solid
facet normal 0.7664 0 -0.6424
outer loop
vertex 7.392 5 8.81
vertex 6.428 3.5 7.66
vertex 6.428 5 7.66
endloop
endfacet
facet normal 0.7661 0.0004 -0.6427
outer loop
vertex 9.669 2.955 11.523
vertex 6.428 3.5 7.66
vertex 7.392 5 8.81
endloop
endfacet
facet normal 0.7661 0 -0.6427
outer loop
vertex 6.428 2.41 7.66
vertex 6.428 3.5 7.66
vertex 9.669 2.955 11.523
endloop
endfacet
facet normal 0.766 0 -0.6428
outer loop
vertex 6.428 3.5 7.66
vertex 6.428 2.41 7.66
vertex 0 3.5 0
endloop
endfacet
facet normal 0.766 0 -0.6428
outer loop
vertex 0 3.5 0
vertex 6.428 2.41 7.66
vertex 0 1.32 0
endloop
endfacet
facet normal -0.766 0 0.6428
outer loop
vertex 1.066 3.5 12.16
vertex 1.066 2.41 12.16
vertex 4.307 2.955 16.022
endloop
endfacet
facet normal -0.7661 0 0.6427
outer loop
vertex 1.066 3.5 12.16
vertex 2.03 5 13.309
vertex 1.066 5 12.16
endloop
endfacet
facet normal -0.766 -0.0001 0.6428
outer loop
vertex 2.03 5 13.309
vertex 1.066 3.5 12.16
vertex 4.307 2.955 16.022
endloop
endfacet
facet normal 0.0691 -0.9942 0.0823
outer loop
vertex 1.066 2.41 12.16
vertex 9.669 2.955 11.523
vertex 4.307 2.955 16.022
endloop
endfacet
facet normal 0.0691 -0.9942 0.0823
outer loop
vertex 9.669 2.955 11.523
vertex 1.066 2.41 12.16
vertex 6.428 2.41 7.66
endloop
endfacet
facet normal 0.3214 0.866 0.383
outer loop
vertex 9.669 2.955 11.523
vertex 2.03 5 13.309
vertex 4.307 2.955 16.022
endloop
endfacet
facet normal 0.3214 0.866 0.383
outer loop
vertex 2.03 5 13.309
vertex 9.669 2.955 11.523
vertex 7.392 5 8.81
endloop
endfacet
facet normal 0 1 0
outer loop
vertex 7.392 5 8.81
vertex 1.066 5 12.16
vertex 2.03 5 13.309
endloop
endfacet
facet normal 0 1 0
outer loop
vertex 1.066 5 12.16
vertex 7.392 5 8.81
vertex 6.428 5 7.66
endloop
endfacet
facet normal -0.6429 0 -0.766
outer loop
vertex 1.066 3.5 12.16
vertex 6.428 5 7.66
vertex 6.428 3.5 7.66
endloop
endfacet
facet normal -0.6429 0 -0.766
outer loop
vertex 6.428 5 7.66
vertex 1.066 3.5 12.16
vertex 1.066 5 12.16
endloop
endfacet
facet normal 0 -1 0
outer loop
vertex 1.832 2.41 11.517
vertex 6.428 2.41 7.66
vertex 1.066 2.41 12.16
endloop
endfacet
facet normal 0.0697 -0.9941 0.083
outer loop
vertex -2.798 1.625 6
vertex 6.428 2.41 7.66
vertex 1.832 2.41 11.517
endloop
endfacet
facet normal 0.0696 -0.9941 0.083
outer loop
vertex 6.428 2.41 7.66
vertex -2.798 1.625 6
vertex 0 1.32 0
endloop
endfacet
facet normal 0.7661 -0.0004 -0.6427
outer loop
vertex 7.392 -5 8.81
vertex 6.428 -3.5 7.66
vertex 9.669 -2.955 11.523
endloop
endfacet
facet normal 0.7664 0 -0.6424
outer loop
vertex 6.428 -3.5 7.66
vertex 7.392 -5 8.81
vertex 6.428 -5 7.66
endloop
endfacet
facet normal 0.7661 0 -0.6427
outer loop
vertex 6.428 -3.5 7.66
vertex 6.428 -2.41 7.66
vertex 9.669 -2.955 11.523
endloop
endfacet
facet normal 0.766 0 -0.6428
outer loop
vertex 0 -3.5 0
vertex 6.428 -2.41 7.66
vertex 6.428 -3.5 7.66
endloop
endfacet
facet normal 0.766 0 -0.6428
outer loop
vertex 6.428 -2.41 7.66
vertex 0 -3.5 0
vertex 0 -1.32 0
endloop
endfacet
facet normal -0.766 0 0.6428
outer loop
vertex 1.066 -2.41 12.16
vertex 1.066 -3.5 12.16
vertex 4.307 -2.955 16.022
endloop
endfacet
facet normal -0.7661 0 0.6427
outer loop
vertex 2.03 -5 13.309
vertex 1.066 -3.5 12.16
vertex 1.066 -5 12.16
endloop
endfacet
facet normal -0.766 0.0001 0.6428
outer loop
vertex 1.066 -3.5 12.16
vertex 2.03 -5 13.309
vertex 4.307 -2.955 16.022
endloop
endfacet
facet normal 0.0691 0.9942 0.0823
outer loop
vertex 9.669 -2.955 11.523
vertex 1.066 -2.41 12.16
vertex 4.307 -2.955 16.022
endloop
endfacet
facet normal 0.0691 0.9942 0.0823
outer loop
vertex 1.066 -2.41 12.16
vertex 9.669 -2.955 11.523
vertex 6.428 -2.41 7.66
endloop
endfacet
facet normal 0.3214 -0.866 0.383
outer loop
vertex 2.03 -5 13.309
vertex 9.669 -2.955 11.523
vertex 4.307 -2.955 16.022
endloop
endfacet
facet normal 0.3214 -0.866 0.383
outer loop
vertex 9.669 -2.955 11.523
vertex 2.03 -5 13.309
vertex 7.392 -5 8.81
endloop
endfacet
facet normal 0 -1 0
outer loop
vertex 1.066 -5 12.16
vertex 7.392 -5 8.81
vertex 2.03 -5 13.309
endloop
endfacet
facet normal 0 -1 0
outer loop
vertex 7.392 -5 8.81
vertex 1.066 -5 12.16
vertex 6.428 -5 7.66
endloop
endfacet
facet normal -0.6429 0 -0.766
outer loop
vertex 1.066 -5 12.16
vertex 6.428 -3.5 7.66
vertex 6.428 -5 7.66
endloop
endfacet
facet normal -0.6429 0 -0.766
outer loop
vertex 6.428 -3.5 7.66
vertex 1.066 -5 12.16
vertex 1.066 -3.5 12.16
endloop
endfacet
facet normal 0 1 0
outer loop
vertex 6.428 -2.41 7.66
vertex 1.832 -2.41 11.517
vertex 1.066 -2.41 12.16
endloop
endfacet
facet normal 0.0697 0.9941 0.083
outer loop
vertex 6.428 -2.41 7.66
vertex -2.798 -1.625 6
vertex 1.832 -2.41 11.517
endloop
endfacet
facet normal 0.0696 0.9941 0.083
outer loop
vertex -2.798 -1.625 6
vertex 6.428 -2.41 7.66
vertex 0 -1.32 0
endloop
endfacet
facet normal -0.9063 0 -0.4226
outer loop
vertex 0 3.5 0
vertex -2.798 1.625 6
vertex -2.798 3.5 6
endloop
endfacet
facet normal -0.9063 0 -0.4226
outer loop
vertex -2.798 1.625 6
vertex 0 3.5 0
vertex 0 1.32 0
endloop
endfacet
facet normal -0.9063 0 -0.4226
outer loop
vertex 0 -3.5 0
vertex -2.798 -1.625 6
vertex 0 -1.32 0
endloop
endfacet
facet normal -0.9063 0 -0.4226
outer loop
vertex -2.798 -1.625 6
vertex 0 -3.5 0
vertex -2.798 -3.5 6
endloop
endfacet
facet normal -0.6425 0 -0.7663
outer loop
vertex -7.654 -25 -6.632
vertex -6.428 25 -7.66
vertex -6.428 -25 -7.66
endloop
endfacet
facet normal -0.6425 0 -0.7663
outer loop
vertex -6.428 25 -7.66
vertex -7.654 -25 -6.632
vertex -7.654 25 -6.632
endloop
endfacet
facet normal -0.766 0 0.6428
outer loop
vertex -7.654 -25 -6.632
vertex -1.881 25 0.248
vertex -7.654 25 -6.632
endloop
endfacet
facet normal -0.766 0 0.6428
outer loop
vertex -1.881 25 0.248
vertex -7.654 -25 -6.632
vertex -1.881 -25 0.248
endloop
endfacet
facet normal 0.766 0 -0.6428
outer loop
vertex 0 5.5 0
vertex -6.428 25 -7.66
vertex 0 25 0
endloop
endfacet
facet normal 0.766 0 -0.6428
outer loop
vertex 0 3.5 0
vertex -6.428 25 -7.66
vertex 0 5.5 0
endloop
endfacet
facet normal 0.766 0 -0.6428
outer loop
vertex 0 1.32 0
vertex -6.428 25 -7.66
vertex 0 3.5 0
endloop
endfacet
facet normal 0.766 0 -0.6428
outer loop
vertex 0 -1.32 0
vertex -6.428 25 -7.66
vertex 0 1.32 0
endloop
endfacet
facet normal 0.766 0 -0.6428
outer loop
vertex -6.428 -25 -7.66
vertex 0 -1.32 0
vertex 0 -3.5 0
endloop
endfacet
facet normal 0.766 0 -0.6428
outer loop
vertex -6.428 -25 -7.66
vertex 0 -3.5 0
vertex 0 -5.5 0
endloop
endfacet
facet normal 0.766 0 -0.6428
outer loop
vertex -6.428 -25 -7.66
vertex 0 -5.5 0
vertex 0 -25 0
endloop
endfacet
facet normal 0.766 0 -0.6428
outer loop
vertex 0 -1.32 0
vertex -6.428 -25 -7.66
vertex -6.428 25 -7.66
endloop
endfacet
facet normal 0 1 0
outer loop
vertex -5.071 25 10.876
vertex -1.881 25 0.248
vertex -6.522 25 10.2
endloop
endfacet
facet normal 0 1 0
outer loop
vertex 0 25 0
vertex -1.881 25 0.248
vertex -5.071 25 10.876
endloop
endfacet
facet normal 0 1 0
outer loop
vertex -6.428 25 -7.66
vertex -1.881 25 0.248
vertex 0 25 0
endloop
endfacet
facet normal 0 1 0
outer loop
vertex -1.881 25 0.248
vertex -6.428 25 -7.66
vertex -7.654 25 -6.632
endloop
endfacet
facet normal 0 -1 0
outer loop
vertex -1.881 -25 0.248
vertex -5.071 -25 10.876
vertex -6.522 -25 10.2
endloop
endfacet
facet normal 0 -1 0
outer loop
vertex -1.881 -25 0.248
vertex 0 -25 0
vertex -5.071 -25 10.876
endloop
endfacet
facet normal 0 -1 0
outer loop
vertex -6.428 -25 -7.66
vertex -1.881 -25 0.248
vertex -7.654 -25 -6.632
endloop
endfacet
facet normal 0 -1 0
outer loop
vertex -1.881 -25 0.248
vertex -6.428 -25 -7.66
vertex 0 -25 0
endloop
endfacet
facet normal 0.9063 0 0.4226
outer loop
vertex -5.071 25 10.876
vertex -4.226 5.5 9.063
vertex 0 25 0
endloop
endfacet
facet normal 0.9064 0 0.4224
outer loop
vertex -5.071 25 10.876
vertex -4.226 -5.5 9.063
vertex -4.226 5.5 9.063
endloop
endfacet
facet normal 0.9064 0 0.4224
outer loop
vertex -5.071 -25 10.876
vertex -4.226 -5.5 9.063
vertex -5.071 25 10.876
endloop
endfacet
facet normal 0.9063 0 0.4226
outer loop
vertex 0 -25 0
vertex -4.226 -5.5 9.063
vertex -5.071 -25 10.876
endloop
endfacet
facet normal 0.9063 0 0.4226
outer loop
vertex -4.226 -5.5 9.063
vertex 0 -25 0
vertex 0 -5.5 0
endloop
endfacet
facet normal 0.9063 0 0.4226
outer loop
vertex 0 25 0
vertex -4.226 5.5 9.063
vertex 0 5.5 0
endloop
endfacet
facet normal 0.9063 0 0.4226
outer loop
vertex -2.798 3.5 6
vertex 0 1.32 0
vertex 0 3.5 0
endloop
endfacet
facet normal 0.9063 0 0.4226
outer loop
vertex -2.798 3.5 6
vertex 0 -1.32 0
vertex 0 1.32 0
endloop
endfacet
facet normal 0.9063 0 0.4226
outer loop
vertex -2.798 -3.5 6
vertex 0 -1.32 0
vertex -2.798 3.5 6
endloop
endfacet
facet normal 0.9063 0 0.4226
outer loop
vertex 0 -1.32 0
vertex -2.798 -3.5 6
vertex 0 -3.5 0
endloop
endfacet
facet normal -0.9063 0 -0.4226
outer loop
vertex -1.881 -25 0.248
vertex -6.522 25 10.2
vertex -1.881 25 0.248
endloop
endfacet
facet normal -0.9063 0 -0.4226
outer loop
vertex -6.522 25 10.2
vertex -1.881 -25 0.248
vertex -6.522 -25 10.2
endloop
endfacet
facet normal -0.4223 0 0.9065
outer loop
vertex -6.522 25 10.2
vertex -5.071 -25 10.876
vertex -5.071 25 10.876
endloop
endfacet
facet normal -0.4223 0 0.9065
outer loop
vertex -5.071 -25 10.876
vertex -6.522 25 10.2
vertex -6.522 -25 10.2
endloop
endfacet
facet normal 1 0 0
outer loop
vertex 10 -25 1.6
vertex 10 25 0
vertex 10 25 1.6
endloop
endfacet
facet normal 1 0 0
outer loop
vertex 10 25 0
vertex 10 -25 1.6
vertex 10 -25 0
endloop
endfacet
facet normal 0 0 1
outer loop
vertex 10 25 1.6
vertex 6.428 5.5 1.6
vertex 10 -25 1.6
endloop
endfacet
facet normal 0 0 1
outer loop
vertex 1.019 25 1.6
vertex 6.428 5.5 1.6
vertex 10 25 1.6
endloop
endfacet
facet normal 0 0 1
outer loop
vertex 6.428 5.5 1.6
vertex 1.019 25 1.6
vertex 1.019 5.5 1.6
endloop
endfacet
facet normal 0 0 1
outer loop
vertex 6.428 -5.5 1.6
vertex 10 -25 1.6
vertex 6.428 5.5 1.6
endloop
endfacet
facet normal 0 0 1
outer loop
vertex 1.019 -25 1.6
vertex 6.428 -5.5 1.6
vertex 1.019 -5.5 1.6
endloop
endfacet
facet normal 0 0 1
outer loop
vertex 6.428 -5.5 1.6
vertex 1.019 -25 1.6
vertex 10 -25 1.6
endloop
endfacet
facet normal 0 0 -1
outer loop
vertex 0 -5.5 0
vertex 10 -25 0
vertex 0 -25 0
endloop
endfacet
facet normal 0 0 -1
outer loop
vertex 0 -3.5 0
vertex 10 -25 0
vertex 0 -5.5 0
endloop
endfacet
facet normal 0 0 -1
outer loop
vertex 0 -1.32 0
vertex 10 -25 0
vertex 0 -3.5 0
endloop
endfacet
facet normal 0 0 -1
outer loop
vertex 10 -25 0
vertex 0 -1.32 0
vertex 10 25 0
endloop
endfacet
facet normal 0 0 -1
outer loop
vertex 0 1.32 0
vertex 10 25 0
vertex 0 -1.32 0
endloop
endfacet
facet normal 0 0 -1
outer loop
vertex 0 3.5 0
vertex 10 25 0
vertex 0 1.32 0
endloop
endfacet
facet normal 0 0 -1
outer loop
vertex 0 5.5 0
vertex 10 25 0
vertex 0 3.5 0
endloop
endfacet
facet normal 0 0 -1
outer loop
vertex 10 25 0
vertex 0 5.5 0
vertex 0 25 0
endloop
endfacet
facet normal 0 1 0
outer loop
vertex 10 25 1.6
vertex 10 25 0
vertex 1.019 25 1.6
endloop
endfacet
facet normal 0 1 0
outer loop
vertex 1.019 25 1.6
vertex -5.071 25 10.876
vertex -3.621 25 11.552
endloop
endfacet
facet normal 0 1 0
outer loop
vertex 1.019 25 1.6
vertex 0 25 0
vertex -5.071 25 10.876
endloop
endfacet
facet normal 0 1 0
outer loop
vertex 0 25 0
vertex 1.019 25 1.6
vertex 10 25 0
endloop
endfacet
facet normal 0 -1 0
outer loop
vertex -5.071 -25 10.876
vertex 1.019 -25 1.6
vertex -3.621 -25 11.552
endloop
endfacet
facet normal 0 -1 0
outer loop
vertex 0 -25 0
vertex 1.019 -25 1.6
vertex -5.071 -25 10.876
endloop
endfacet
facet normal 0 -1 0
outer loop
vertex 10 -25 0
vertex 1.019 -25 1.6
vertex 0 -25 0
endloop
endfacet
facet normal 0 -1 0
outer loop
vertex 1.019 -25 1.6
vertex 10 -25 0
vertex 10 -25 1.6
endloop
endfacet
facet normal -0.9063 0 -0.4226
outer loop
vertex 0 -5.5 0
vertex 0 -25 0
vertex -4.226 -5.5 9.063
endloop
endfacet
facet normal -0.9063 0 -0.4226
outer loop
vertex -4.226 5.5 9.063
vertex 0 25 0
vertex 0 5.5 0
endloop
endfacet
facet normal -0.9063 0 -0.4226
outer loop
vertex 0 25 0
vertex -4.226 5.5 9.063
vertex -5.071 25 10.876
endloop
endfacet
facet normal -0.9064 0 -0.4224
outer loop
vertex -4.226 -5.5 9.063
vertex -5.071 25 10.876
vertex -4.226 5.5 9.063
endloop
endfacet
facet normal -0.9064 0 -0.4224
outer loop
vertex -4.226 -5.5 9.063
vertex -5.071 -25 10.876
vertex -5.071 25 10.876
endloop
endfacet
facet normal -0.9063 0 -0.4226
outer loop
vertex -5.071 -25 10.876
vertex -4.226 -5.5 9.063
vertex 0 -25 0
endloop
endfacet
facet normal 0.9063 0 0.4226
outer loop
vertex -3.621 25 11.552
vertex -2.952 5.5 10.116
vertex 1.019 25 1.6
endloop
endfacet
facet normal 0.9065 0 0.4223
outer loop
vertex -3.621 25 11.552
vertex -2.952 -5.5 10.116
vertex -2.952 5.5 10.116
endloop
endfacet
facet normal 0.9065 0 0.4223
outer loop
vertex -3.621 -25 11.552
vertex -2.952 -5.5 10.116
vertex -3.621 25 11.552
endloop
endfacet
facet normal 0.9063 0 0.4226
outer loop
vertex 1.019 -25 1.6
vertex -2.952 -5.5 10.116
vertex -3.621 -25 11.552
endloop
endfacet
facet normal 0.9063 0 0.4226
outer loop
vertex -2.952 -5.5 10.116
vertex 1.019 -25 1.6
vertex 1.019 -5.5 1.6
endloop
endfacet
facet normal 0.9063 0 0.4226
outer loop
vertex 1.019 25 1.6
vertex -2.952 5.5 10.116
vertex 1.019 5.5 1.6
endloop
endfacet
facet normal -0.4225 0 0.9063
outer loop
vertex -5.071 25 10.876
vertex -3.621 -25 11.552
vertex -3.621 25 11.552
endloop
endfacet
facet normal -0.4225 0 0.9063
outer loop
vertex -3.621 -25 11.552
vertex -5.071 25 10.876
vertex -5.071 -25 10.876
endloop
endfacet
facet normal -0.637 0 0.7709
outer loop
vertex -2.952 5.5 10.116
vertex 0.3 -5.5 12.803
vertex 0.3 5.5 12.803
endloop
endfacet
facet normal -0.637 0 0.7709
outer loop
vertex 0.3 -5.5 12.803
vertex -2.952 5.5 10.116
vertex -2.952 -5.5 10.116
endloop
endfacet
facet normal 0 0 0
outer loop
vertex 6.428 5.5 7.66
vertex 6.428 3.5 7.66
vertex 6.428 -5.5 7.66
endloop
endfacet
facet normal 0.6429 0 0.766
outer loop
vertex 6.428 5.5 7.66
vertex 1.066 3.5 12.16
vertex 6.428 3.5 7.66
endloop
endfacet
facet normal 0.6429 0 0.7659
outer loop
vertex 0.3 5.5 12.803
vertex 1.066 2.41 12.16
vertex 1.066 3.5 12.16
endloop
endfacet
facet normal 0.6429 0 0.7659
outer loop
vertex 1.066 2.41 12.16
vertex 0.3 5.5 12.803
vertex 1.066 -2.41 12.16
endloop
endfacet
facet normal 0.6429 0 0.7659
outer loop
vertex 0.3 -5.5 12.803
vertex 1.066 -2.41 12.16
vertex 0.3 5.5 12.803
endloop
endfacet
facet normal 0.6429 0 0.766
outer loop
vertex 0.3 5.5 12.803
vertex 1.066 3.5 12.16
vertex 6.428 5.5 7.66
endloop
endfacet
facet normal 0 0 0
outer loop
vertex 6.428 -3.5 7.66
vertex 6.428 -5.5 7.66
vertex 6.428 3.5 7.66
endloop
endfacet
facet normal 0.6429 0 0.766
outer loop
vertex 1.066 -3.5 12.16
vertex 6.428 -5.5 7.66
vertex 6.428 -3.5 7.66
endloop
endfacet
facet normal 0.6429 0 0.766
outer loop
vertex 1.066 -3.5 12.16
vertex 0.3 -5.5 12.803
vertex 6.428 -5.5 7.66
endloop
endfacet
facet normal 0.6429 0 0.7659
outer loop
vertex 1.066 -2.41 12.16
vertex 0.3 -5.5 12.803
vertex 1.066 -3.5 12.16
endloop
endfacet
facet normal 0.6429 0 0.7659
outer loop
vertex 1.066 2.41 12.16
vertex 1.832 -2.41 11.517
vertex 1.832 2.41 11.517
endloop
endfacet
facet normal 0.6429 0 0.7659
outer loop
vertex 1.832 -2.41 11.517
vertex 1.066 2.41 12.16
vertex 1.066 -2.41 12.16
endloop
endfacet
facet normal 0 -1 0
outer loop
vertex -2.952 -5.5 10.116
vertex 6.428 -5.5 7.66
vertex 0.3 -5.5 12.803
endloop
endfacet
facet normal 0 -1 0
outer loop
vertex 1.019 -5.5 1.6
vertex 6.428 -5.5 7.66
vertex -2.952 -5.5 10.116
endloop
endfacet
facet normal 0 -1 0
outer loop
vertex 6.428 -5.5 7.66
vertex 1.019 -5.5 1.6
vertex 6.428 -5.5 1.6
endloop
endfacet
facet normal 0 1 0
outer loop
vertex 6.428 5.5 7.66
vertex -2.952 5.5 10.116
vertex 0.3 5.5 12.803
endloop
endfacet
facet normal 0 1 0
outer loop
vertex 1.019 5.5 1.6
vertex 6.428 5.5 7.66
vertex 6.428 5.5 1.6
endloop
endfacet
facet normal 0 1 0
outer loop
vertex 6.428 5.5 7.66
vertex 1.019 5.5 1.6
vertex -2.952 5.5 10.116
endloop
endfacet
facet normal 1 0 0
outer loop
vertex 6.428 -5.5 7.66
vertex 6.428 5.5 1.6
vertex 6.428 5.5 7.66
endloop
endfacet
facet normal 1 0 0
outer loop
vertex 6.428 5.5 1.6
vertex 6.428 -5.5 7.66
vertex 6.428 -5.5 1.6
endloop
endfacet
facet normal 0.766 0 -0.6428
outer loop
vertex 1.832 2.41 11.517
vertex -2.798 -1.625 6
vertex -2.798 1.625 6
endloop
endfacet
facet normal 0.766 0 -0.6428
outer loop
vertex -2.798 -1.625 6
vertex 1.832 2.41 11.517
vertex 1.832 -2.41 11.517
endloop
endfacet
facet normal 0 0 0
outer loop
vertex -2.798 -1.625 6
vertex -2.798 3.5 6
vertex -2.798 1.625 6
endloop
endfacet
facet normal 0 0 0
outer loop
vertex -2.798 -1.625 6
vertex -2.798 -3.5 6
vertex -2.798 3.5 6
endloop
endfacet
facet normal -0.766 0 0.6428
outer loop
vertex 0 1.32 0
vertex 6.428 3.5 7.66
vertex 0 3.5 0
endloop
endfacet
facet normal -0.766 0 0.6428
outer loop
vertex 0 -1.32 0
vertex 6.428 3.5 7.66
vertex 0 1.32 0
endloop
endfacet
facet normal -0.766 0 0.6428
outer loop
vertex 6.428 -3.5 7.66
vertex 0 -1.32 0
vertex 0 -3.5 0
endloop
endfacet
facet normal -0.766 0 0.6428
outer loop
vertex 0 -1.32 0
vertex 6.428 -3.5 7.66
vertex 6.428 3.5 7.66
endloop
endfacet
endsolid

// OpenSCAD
// file: SnapLib.0.36.scad
/*simple Snap library based on "Snap-Fit Joints for Plastics - A Design Guid" by Bayer MaterialScience LLC 
  http://fab.cba.mit.edu/classes/S62.12/people/vernelle.noel/Plastic_Snap_fit_design.pdf
 
 on http://www.thingiverse.com/thing:1860118
 
    by fpetrac Fausto Petraccone fpetrac@gmail.com 
    Licensed under the Creative Commons - Attribution - Non-Commercial license.
*/

/*Rev
    SnapLib 0.36.scad: added SnapHoleY function  
    SnapLib 0.35.scad: on RSnapY added a check to avioid interference of lobes during closure; on RRSnappY added a check to avioid overlapped lobes.
    SnapLib 0.30.scad  added function Hsnap and Snap to calculate the snap H or Y for cantilever snap
    SnapLib 0.25.scad  added Scale factor f to reduce the calculate value h or y (this mantain the snap on unbreakable zone when f>1)
    SnapLib 0.20.scad  Bug Fix
    SnapLib 0.10.scad  added RSnapY RRSnapY
    SnapLib 0.00.scad  first release
*/


/*
eps=0.5*6/100;//Elongation at break of PLA=6%
eps=0.5*12/100;//Elongation at break of ABS=12%
*/
//eps=0.5*18/100;//Elongation at break of PETG=18%


eps=0.5*6/100;//Elongation at break of PLA=6%


function Hsnap(l,y,f)= (1.09/f)*(eps*pow(l,2))/(y);
function Ysnap(l,h,f)= (1.09/f)*(eps*pow(l,2))/(h);

//SnapH(l,y,a,b,f=1) Define y calculate h and divide the calculte h value to a factor f
module SnapH(l,y,a,b,f=1)   
{
    h=Hsnap(l,y,f);
    p=y;
    echo("h is",h);
linear_extrude(height = b, center = f, convexity = 10, twist = 0)
polygon([[0,0],[l,0],[l,y],[l+p,y],[l+p+(y+h/4)/tan(a),-h/4],[l,-h/2],[0,-h]]);
}
//SnapY(l,h,a,b,f=1) Define h calculate y and divide the calculte y value to a factor f
module SnapY(l,h,a,b,f=1)
{
    y=Ysnap(l,h,f);
    p=y;
    echo("y is", y);
linear_extrude(height = b, center = f, convexity = 10, twist = 0)
polygon([[0,0],[l,0],[l,y],[l+p,y],[l+p+(y+h/4)/tan(a),-h/4],[l,-h/2],[0,-h]]);
}
//SnapHoleY(l,h,a,b,f=1,Pr=2) Define h calculate y and divide the calculte y value to a factor f the total hole depth is h*PR
module SnapHoleY(l,h,a,b,f=1,Pr=2){
        //%SnapY(l,h,a,b);  
        y=Ysnap(l,h,f);
        YY=Pr*h;//depth Y;
        XX=1.1*(y+(y+h/4)/tan(a)); //Altezza totale +10%
        ZZ=0+b; //largezza piu tolleranza
        union(){
            translate([0,-YY,(b-ZZ)/2])cube([l,YY,ZZ],center=false); //gambo
            translate([l,-YY,(b-ZZ)/2])cube([XX,YY+y,ZZ],center=false);//testa
        }    
 }



//Define h calculate y and divide the calculated value to f
module RSnapY(l,h,a,Lobi,r2,f=1,K2=2)   
{
    Theta=180/Lobi;
    y=(1.64/f)*K2*(eps*pow(l,2))/(r2);
    p=y;
    echo("y is", y);
    echo("r1/r2",(r2-h)/r2);
    echo("Theta", Theta);
    echo("r2-h",(r2-h));
    if(((r2-h)>y)&&(h<r2)){ //(r2-h)>y should be (r2-h/2)>y and  h<r2 for scad problem
      for(f=[0:1:Lobi])
          rotate([0,0,Theta*2*f])
              rotate_extrude(angle = Theta, convexity = 2,$fn=200)
                  translate([r2,0,0])
                      mirror([1,-1,0])
                          polygon([[0,0],[l,0],[l,y],[l+p,y],[l+p+(y+h/4)/tan(a),-h/4],[l,-h/2],[0,-h]]);
    }
    else{
      echo ("<b>WARNING:</b>");
      echo("y should be < r2-h ");
      echo("h should be < r2 ");
    }
}
//Define h calculate y and divide the calculated value to f
module RRSnapY(l,h,a,Lobi,r2,f=1,K1=2)
{
    Theta=180/Lobi;
    y=(1.64/f)*K1*(eps*pow(l,2))/(r2);
    p=y;
    echo("y is", y);
    echo("r1/r2",(r2-h)/r2);
    echo("Theta", Theta);
    echo("r2-y",(r2-y));
    if(y<r2){
      for(f=[0:1:Lobi])
          rotate([0,180,Theta*2*f])
              rotate_extrude(angle = Theta, convexity = 2,$fn=200)
                  translate([r2,0,0])
                      mirror([1,1,0])
                          polygon([[0,0],[l,0],[l,y],[l+p,y],[l+p+(y+h/4)/tan(a),-h/4],[l,-h/2],[0,-h]]);
  }
      else{
      echo ("<b>WARNING:</b>");
      echo("y should be < r2 ");
      }
}
// main file
include <SnapLib.0.36.scad>

// triangle face coordinates
p1=[0,0];
p2=[15,0];
p3=[10,10];
$fn=30;
border =1;
gw=0.4;
gs=4;
max=30;
module tri (a,b,c)  polygon([a,b,c]);
rh=10;
thick=1.6;
angle=25;
d=10;
module male(rm) {
translate([0,0,-thick])linear_extrude(thick) polygon( [[-rm/tan(angle/2),-rm],for(a=[90+angle:-2*angle/20:90-angle]) [rm*cos(a),rm*sin(a)],[rm/tan(angle/2),-rm]]);
rotate([0,0,-45])RSnapY(3.4*thick,3,30,2,rm*0.6,f=1.5,K2=2);
}

module female(rm) {
  difference() {
    union() {
      linear_extrude(thick) polygon( [[-rm/sin(angle/2),-rm],for(a=[180-angle:-3:angle]) [rm*cos(a),rm*sin(a)],[rm/sin(angle/2),-rm]]);
      translate([0,0,thick]) cylinder(r1=rm,r2=rm*0.7,h=2*thick);
    }
    cylinder(r=rm*0.6,h=4*thick);
  }
}
module male1(alpha,h,w,depth,eps=0.1) {
difference() {
    union() {
        translate([0,h/2,0]) SnapH(depth,1.5,30,h,f=1);
        mirror([0,1,0]) translate([0,h/2,0]) SnapH(depth,1.5,30,h,f=1);
    }
    rotate([0,alpha,0]) translate([-5,-h/2-eps,0]) cube([5,h+2*eps,2*h]);
}
}

module female1() {
    translate([0,-3,0])cube([10,6,7]);
}

module Malemold(h,w) {
translate([0,-25,0])cube([10,50,thick]);
rotate([0,-angle,0])translate([0,-25,0])cube([thick,50,12]);
mirror([1,0,0]) male1(angle,h,w,d);
}
mirror([1,0,0]) color("green")rotate([0,2*angle,0])Malemold(7,6);
module Femalemold(h,w) {
difference() {
    union() {
        translate([0,-25,0])cube([10,50,thick]);
        rotate([0,-angle,0])translate([0,-25,0])cube([thick,50,12]);
        translate([0,2+h/2,0])rotate([90,0,0])linear_extrude(h+4) polygon([[0,0],[d*cos(2*angle),0],[d*cos(2*angle),d*sin(2*angle)],[d*cos(2*angle)-(w+2)*sin(2*angle),d*sin(2*angle)+(w+2)*cos(2*angle)],[-d*sin(angle),d*cos(angle)]]);
        //rotate([0,-2*angle,0])cube([20,10,10]);
        }
        translate([0,-h/2,0]) rotate([0,-2*angle,0])cube([20,h,w]);
        }
        }
  Femalemold(7,6);      
//translate ([0,3*rh,0]) rotate([90,0,0]) male(rh);
//rotate([90,0,0])female(rh);
/*
difference() {
    tri(p1,p2,p3);
    offset(-border) tri(p1,p2,p3);
    }

intersection() {
    tri(p1,p2,p3); 
    union() {
        for(i=[-max:gs:max]) {
            polygon([[-max,i],[max,i],[max,i+gw],[-max,i+gw]]);
            polygon([[i,-max],[i,max],[i+gw,max],[i+gw,-max]]);
        }
    }
}
*/
        
